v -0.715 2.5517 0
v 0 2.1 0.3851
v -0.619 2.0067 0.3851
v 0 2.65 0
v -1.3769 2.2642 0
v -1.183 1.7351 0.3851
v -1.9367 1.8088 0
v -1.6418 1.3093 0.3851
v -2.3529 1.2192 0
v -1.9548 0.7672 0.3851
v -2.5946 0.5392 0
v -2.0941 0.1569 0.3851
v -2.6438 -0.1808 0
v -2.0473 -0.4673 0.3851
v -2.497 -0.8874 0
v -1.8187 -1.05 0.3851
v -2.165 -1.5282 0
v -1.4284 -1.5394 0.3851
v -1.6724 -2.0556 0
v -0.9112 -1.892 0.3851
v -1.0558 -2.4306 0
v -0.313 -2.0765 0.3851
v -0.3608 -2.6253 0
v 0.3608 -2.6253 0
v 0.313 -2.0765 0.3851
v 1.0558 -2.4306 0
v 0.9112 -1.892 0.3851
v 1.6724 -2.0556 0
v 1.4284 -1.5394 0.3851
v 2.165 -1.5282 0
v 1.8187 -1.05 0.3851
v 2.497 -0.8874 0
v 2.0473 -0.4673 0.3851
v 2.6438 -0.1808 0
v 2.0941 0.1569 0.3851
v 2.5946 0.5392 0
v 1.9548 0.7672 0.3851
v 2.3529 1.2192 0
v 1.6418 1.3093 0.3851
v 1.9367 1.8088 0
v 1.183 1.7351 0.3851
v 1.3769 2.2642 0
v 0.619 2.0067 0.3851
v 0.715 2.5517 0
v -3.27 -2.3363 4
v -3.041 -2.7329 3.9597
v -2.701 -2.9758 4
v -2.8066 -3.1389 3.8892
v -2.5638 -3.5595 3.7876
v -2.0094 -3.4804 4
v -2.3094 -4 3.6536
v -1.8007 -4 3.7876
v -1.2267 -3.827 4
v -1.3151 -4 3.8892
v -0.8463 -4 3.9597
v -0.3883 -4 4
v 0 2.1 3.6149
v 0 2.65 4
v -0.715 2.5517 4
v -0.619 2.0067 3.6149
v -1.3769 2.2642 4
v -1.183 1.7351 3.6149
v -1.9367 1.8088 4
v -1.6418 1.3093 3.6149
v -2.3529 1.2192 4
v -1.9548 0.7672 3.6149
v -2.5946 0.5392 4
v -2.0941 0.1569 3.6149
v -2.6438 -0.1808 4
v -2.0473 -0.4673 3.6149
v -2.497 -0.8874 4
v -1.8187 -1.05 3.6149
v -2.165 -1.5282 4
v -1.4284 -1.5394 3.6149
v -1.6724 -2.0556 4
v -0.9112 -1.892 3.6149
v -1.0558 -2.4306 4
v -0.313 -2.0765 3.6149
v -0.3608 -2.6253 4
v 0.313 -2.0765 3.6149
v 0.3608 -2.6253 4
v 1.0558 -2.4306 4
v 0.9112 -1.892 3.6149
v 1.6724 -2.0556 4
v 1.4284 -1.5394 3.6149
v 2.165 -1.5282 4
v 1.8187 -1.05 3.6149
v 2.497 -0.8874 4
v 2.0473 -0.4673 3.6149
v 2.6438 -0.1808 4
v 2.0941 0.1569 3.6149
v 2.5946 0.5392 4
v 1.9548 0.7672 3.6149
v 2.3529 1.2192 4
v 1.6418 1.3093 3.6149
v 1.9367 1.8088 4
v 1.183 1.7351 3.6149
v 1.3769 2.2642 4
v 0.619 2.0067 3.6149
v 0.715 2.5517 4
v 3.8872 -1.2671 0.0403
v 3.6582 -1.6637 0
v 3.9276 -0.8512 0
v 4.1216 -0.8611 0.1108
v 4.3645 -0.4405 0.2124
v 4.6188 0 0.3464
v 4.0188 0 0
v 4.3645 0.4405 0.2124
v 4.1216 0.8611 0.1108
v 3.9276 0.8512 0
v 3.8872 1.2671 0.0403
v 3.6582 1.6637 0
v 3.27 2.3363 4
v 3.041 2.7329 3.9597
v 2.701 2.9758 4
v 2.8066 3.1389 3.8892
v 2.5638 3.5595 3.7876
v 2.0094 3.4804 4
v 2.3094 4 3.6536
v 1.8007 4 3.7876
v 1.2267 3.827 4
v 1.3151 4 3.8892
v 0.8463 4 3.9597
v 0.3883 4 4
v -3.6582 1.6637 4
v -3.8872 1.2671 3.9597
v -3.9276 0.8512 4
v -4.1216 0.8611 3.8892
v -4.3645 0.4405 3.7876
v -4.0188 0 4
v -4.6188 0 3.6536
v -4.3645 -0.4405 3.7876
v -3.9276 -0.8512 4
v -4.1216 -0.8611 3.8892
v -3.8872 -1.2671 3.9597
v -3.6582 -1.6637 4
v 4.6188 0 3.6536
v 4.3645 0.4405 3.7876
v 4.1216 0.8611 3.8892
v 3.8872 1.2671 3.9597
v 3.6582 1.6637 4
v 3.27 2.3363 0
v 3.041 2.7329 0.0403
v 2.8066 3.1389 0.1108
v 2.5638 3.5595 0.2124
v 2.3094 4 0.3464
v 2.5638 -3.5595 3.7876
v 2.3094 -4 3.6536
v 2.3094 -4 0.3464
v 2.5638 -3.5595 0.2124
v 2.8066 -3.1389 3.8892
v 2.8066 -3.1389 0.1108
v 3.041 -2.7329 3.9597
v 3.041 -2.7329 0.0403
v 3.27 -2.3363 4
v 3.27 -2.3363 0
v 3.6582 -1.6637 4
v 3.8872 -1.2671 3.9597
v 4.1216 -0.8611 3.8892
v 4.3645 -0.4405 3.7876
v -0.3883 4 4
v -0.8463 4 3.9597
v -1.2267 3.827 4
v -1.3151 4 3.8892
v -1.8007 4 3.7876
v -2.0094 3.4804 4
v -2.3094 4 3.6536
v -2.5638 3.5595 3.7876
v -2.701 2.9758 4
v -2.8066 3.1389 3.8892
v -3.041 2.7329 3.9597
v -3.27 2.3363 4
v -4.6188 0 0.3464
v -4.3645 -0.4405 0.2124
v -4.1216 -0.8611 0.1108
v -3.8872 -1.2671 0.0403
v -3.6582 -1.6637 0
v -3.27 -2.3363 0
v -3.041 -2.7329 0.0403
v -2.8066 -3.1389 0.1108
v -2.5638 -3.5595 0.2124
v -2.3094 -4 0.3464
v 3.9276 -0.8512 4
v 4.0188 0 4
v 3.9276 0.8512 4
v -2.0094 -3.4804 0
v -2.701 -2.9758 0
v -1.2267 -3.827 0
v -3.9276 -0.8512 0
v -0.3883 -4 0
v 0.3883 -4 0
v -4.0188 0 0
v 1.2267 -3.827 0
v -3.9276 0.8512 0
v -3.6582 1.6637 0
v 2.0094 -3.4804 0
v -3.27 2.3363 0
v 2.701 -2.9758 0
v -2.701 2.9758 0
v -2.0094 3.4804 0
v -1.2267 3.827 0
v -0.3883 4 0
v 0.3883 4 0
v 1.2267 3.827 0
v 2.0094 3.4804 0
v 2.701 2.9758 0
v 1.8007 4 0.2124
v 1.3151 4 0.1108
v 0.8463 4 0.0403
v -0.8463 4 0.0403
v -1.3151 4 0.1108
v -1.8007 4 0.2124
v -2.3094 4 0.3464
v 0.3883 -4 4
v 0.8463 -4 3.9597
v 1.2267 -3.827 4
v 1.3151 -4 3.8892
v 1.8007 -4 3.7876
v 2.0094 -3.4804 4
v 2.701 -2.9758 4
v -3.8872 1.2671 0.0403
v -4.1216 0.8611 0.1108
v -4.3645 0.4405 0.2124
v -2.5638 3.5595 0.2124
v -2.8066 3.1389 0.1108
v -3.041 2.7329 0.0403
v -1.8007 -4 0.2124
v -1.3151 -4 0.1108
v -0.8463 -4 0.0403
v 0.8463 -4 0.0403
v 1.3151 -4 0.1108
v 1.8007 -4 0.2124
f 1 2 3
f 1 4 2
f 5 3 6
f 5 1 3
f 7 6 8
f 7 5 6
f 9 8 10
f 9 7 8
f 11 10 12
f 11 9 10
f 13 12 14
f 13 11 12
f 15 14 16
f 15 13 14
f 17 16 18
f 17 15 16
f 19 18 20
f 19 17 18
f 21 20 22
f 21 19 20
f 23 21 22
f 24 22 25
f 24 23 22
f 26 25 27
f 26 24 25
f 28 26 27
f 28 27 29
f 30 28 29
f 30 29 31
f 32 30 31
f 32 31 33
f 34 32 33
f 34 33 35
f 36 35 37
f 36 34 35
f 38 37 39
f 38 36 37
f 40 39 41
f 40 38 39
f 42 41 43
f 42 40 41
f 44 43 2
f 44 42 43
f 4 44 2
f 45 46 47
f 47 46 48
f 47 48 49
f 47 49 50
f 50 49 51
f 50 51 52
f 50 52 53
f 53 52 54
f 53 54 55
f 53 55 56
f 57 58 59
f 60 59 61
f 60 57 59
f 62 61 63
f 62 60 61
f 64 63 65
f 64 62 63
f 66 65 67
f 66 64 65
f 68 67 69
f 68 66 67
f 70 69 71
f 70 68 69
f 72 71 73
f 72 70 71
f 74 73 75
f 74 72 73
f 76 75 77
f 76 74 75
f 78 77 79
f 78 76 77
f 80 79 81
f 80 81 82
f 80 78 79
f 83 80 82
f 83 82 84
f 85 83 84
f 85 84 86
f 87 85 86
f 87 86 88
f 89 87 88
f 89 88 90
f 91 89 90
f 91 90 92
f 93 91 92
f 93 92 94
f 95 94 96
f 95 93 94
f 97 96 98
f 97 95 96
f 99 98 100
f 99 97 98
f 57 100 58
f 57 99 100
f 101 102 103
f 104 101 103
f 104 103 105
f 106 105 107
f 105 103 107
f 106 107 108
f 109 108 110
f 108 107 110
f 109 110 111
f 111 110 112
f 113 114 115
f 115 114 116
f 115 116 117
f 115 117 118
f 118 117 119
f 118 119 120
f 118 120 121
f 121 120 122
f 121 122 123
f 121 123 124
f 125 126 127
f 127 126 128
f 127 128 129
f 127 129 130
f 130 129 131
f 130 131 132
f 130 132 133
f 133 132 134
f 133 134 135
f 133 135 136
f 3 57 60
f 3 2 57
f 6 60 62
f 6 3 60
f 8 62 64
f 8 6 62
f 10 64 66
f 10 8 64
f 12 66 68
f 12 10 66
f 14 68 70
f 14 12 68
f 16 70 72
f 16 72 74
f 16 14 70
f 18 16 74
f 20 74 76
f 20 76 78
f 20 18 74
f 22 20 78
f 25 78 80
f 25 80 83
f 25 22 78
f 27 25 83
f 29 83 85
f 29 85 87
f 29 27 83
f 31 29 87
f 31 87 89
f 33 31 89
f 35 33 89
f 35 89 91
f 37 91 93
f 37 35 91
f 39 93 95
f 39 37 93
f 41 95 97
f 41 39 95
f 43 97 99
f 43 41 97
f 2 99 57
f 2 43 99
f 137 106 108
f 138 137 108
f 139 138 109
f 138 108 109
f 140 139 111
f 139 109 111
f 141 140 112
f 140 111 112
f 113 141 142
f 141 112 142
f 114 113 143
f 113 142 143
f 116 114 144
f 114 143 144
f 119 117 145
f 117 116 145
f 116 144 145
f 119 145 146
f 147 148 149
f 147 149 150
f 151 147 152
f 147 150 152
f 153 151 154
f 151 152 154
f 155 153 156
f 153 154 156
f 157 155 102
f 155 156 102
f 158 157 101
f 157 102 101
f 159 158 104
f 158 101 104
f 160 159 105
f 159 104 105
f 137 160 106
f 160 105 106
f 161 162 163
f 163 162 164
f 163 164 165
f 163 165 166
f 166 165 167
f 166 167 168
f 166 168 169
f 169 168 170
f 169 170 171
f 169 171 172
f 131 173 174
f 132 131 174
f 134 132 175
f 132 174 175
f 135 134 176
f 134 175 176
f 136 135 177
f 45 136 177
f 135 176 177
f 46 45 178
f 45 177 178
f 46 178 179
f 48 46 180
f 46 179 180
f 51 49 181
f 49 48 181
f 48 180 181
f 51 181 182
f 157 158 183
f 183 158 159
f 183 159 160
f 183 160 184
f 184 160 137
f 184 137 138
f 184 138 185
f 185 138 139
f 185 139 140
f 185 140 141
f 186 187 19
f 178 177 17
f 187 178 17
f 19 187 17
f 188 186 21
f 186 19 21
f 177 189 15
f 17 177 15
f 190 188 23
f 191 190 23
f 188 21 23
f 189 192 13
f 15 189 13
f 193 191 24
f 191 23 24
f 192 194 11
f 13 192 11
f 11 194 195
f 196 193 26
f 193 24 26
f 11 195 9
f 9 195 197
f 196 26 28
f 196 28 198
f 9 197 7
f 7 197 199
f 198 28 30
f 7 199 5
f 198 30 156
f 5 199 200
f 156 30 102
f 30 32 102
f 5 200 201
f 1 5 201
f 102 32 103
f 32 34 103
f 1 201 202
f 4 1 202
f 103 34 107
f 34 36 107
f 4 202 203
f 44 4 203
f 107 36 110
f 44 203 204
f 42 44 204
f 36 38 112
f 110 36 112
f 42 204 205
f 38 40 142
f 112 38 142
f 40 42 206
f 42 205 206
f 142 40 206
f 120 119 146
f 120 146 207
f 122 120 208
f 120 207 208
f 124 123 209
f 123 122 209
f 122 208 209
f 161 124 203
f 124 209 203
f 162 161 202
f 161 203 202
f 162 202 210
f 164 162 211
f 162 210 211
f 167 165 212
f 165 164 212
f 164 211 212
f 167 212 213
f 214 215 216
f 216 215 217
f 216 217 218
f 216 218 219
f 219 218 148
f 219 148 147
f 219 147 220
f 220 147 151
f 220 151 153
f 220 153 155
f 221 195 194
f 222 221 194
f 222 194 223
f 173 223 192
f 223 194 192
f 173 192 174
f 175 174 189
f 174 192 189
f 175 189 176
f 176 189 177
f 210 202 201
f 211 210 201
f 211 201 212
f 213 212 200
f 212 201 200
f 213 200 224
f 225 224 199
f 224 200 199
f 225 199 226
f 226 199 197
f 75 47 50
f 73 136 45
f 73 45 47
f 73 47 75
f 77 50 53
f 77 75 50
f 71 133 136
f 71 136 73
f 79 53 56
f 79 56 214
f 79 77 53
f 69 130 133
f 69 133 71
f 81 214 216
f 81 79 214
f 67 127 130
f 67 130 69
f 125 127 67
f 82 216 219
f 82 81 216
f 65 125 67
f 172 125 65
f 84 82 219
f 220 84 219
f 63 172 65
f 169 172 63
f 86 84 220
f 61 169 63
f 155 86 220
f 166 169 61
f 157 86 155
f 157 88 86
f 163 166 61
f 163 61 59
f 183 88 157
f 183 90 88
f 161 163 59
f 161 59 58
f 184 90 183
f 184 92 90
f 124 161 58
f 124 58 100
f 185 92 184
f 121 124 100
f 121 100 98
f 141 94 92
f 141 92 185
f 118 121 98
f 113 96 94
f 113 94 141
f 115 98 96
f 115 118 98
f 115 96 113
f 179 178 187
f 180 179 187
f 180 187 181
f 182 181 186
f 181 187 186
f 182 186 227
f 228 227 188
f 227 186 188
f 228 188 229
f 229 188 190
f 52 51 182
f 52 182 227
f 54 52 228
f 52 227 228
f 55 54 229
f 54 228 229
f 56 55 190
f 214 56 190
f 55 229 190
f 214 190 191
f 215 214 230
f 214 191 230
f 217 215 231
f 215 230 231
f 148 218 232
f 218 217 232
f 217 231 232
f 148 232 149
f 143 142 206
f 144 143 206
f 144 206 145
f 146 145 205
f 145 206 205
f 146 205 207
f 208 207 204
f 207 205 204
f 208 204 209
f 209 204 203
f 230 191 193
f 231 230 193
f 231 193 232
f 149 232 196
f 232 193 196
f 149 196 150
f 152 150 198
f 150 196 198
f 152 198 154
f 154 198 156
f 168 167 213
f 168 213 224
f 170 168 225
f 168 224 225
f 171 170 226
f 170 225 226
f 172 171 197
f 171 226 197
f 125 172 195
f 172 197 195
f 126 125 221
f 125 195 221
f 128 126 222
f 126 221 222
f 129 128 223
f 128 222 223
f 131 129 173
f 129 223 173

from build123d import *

# Parameters (mm, degrees)
EXTRUDE_1_DEPTH = 4


with BuildPart() as part:
    # Эскиз1 → Бобышка-Вытянуть1 (new body)
    with BuildSketch(Plane.XY):
        Polygon((4.618802154, 0), (2.309401077, 4), (-2.309401077, 4), (-4.618802154, 0), (-2.309401077, -4), (2.309401077, -4), align=None)
    extrude(amount=EXTRUDE_1_DEPTH)

    # Эскиз2 → Вырез-Повернуть2 (revolve, cut)
    with BuildSketch(Plane(origin=(0, 0, 0), x_dir=(1, 0, 0), z_dir=(0, 1, 0))):
        Polygon((-4.018802154, 0), (-4.018802154, 0.812802913), (-5.016585269, 0.812802913), (-5.016585269, -4.215003636), (-4.018802154, -4.215003636), (-4.018802154, -4), (-4.618802154, -3.653589838), (-4.618802154, -0.346410162), align=None)
    revolve(axis=Axis((0, 0, 0), (0, 0, 1)), mode=Mode.SUBTRACT)

    # Эскиз3 → Отверстие обработанное метчиком M51 (revolve, cut)
    with BuildSketch(Plane.YZ):
        Polygon((0, 0), (0, 4), (2.65, 4), (2.1, 3.614885854), (2.1, 0.385114146), (2.65, 0), align=None)
    revolve(axis=Axis((0, 0, -6.35), (0, 0, 1)), mode=Mode.SUBTRACT)


solid = part.part
